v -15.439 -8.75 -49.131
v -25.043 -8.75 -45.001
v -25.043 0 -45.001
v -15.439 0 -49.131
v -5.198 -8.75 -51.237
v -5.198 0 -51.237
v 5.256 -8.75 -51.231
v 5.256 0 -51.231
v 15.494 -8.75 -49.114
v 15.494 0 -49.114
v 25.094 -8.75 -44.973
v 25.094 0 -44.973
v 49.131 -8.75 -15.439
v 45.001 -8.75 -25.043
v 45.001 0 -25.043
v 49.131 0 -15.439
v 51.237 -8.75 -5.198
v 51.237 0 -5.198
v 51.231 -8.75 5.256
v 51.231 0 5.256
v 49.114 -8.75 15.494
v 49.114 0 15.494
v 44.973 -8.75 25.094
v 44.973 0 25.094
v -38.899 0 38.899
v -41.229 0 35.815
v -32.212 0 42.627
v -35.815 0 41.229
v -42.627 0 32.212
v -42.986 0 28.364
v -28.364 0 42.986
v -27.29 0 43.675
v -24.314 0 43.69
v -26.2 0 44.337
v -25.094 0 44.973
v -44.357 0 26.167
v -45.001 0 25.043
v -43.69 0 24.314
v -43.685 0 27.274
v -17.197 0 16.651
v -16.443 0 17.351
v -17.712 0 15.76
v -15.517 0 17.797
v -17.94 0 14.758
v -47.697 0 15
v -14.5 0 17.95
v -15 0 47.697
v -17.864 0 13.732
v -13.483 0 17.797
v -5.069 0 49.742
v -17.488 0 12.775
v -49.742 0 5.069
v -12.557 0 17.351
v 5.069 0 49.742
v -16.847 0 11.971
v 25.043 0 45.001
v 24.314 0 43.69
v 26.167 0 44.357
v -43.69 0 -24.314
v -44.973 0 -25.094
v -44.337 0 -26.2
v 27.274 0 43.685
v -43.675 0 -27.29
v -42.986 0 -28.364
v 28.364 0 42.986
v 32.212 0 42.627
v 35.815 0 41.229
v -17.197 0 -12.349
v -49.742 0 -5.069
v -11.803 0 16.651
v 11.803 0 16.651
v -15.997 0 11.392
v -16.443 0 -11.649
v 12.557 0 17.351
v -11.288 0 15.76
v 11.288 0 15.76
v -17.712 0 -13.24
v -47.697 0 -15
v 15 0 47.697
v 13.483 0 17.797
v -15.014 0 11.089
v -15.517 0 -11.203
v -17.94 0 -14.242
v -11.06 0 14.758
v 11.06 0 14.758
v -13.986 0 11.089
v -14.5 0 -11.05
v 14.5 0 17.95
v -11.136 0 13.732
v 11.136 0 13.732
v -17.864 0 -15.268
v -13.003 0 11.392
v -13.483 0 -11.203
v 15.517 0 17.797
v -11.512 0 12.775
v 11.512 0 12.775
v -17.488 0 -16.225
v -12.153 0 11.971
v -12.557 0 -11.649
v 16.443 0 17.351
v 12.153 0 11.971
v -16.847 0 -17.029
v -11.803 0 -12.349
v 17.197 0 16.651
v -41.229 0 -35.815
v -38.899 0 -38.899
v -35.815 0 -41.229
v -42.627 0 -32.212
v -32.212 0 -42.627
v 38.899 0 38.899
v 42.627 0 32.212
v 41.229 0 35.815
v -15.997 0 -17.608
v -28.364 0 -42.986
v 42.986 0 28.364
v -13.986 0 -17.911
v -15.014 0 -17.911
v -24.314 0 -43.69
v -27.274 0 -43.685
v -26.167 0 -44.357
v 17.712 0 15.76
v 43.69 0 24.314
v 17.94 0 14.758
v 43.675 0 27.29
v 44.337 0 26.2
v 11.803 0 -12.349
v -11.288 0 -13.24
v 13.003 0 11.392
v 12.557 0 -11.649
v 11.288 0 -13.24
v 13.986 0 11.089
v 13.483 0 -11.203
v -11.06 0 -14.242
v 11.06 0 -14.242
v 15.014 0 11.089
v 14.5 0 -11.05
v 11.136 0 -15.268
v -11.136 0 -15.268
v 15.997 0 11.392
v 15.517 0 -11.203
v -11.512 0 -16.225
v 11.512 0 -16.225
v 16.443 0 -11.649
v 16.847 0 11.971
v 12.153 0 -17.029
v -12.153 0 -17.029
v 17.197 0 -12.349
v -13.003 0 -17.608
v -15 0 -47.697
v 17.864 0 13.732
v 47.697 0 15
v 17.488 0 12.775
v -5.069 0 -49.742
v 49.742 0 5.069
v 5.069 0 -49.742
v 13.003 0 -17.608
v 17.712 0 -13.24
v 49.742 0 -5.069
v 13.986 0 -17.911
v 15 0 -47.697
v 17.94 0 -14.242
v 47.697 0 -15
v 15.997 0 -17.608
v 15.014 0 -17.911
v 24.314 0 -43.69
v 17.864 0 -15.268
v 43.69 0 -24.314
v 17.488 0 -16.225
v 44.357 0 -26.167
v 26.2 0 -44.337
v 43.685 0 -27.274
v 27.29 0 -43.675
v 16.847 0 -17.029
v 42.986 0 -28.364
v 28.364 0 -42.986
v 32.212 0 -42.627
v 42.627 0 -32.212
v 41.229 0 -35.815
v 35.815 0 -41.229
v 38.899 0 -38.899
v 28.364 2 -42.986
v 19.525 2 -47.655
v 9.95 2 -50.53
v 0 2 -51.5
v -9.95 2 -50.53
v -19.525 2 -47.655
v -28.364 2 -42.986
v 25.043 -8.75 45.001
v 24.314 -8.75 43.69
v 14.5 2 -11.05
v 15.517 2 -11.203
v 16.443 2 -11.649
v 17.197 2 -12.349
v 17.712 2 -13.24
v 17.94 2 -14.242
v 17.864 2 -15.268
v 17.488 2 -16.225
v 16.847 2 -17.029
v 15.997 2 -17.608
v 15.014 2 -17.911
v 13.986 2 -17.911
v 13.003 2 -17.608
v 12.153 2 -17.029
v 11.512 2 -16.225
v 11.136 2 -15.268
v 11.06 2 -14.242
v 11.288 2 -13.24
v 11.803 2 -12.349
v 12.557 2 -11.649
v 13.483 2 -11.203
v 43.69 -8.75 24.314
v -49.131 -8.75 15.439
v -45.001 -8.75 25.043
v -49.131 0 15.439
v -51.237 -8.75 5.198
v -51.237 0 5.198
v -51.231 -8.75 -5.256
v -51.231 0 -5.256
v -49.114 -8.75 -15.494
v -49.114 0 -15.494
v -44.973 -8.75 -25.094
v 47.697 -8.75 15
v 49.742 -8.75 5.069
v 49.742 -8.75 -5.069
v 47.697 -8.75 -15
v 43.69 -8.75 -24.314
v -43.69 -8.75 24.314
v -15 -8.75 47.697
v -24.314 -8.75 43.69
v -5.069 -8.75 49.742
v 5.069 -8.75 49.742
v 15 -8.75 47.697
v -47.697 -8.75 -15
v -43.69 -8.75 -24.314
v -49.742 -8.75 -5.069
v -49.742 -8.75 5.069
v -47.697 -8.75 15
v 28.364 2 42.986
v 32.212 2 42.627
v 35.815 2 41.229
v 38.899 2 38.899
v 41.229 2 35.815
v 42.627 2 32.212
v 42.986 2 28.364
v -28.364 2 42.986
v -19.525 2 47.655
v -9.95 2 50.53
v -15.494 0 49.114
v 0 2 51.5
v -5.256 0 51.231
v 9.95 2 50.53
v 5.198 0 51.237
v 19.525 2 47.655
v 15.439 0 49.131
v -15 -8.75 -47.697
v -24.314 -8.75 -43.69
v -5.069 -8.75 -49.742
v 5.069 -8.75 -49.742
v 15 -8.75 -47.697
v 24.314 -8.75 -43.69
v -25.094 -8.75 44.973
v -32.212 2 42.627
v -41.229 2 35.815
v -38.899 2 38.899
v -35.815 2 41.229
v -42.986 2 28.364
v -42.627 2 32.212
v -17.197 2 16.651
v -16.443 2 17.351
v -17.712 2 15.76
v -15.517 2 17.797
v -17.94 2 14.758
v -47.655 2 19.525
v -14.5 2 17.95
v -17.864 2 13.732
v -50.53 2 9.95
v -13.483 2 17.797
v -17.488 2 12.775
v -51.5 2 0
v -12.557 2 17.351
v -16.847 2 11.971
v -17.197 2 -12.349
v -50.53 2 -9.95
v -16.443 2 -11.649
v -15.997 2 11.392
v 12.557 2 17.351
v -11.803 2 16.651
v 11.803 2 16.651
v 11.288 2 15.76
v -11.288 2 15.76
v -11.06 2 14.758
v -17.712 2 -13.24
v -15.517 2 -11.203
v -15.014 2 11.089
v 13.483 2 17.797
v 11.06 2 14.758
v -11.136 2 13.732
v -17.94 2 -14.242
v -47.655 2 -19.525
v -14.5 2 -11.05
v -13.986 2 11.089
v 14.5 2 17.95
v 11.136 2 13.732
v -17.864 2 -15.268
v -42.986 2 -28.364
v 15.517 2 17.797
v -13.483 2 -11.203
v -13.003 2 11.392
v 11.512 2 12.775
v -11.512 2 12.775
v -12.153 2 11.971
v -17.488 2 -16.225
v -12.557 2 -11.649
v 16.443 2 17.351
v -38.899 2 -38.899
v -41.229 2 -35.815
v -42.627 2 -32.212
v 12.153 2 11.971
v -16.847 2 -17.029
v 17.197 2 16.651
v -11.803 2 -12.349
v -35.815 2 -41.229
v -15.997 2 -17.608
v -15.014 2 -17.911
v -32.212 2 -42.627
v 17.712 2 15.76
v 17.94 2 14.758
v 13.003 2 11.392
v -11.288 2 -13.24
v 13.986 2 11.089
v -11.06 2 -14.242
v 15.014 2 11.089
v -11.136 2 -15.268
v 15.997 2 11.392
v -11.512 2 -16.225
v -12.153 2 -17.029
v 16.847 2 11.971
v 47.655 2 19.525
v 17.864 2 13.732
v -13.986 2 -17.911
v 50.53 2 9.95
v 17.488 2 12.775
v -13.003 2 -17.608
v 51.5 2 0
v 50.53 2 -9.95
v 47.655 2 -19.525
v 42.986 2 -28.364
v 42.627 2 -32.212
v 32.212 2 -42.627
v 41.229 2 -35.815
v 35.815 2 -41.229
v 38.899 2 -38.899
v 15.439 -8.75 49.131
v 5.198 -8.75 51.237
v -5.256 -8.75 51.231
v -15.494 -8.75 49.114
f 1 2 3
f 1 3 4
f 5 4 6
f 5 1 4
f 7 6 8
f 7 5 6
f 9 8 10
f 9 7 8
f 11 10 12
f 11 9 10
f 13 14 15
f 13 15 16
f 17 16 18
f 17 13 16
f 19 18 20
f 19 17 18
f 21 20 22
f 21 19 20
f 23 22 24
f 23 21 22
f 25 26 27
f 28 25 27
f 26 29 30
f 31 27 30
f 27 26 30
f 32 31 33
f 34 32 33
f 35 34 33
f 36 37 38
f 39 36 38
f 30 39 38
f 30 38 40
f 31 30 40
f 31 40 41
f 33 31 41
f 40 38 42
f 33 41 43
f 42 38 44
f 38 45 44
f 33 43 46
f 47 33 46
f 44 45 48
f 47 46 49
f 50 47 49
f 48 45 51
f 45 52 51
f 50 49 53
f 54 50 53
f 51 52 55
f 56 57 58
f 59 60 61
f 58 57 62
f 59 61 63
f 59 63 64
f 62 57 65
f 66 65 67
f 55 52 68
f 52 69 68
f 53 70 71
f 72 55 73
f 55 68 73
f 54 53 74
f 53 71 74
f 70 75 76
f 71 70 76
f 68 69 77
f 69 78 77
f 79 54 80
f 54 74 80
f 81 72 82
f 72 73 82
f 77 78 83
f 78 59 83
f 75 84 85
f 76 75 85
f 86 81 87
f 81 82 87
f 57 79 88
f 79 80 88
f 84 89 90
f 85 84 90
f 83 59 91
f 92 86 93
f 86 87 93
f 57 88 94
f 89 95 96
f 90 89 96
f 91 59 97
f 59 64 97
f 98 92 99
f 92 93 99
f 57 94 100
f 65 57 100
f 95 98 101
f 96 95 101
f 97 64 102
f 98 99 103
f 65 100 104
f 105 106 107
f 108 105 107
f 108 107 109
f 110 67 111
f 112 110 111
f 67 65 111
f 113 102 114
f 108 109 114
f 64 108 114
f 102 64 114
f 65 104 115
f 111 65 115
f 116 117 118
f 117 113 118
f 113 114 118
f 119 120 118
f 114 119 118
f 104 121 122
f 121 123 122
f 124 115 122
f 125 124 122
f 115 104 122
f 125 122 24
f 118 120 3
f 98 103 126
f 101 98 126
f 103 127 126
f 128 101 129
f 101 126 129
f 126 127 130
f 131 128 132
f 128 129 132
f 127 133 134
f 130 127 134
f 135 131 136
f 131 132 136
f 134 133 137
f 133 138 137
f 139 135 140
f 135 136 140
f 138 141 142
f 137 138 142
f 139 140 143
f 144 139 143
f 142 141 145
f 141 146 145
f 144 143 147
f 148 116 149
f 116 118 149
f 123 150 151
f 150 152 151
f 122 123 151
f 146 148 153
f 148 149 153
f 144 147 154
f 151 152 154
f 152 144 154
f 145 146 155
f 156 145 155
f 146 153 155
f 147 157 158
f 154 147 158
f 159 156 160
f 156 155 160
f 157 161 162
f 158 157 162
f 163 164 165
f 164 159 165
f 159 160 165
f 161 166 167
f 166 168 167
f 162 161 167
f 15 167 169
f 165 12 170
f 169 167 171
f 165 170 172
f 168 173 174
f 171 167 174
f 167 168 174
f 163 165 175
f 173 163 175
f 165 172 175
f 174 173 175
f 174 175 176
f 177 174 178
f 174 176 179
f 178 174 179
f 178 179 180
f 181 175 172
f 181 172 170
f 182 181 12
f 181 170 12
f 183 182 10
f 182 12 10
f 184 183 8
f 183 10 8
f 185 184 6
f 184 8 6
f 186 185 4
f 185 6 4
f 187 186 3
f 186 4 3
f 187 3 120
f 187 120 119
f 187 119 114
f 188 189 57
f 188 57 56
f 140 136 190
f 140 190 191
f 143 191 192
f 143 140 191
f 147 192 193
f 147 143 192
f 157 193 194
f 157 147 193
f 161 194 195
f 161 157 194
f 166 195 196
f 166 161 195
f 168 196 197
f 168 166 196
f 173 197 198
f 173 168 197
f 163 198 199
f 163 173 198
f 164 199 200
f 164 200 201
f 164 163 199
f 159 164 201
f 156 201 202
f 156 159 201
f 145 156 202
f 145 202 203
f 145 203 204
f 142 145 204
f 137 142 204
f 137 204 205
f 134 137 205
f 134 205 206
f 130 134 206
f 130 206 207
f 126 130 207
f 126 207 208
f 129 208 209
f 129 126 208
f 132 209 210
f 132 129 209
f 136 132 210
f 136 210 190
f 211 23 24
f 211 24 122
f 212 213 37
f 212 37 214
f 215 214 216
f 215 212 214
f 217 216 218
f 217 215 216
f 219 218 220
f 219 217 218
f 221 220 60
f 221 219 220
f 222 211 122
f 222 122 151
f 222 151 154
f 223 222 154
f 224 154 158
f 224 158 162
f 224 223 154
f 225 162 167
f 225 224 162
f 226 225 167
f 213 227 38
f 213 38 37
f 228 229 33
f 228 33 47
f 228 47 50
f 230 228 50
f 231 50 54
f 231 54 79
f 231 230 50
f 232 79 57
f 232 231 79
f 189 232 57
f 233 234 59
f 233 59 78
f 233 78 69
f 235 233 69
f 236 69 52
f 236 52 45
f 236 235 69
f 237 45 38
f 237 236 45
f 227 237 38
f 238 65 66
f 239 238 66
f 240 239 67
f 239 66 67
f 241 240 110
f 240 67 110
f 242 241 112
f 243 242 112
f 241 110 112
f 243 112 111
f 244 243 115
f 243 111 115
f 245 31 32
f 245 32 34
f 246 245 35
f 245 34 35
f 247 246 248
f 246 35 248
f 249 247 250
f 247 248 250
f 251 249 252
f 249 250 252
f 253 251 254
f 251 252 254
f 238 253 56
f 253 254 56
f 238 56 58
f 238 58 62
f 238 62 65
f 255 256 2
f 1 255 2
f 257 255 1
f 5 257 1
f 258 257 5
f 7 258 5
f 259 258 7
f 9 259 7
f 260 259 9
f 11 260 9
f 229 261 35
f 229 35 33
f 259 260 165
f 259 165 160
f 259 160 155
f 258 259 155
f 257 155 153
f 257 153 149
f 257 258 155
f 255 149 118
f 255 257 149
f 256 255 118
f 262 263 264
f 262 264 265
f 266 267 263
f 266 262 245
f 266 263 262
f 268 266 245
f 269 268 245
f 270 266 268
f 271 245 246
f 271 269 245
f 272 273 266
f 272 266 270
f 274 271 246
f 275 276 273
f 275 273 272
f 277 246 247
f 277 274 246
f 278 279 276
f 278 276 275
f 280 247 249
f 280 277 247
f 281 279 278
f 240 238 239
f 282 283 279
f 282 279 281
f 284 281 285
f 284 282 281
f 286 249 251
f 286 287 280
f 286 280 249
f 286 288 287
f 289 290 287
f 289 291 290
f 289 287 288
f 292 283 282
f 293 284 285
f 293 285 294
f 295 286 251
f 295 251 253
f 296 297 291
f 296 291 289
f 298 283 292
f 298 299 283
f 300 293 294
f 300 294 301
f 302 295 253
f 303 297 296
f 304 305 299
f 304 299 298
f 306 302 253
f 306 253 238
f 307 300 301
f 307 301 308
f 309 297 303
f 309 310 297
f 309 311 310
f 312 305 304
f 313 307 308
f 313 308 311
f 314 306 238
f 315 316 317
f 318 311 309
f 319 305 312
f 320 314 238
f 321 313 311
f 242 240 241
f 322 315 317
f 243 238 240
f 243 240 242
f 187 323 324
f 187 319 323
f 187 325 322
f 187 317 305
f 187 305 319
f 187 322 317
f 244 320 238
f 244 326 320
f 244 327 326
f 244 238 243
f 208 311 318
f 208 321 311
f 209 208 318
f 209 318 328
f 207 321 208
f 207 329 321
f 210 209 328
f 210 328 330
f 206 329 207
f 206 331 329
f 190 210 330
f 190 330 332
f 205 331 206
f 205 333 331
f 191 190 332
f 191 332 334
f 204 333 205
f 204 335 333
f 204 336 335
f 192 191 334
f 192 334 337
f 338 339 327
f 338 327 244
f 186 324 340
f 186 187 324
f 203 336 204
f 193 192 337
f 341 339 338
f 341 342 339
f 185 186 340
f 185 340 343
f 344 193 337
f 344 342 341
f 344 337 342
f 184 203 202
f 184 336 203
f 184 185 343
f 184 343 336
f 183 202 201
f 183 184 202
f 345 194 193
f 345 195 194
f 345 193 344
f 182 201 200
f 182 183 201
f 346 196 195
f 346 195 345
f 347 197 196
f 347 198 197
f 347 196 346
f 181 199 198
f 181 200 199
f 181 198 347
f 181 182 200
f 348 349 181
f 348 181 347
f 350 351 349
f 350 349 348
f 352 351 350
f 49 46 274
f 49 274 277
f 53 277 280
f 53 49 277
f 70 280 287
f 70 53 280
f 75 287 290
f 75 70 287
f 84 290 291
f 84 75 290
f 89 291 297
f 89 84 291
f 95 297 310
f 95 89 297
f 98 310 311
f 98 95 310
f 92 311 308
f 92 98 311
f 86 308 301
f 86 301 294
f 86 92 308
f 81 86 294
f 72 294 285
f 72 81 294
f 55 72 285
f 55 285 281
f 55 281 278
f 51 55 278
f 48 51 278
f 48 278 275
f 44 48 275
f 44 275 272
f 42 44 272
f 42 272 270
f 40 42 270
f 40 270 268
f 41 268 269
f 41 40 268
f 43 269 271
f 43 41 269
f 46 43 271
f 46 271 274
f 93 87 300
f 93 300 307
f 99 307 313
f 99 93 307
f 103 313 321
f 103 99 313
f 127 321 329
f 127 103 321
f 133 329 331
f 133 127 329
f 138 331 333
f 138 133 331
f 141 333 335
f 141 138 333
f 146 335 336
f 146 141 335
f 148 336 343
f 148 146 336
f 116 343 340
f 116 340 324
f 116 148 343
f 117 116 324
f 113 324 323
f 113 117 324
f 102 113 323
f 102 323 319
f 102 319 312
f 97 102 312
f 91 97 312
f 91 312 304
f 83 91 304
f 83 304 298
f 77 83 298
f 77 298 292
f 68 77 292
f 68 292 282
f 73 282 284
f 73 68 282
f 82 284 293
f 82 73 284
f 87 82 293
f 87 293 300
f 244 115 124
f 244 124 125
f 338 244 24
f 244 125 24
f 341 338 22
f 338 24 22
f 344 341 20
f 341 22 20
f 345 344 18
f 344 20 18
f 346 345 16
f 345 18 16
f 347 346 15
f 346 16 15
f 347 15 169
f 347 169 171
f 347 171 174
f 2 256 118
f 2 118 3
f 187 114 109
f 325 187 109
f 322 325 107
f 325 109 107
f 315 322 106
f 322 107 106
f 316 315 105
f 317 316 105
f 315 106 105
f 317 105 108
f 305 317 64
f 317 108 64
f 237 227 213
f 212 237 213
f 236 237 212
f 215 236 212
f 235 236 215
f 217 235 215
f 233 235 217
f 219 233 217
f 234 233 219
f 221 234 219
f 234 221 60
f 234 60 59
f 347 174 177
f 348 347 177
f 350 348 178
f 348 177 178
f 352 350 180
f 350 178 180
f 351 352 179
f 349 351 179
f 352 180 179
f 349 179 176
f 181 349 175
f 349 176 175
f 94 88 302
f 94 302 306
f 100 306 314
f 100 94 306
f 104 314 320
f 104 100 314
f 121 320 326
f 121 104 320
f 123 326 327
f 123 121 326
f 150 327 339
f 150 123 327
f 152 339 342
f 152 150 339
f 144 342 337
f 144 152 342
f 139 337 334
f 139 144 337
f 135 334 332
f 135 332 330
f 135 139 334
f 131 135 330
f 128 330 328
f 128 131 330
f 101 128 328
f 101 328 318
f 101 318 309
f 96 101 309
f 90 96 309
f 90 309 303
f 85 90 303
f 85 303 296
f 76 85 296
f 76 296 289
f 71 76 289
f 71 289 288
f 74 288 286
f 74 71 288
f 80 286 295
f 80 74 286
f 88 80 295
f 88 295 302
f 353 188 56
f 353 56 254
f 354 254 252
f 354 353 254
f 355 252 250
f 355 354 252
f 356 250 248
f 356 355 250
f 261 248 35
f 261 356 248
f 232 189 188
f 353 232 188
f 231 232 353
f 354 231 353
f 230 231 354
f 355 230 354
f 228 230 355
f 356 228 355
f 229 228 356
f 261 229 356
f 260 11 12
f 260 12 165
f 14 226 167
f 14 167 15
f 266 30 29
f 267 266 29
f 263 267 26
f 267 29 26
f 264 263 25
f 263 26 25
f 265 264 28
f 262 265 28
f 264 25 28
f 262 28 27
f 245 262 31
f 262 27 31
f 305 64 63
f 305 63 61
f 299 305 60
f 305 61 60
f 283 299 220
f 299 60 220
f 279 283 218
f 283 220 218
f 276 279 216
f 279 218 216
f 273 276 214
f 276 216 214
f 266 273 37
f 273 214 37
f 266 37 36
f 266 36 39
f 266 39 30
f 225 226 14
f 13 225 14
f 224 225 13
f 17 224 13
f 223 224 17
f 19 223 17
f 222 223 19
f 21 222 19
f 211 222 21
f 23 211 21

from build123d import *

# Parameters (mm, degrees)
SKETCH1_R           = 3.45
BOSS_EXTRUDE1_DEPTH = 2
BOSS_EXTRUDE2_START = 8.75
BOSS_EXTRUDE2_DEPTH = 8.75
CIRPATTERN1_COUNT   = 4


with BuildPart() as part:
    # Sketch1 → Boss-Extrude1 (new body)
    with BuildSketch(Plane(origin=(0, 0, 0), x_dir=(1, 0, 0), z_dir=(0, 1, 0))):
        with BuildLine():
            ThreePointArc((28.363609444, -42.985528487), (38.899494937, -38.899494937), (42.985528487, -28.363609444))
            ThreePointArc((42.985528487, -28.363609444), (51.5, 0), (42.985528487, 28.363609444))
            ThreePointArc((42.985528487, 28.363609444), (38.899494937, 38.899494937), (28.363609444, 42.985528487))
            ThreePointArc((28.363609444, 42.985528487), (0, 51.5), (-28.363609444, 42.985528487))
            ThreePointArc((-28.363609444, 42.985528487), (-38.899494937, 38.899494937), (-42.985528487, 28.363609444))
            ThreePointArc((-42.985528487, 28.363609444), (-51.5, 0), (-42.985528487, -28.363609444))
            ThreePointArc((-42.985528487, -28.363609444), (-38.899494937, -38.899494937), (-28.363609444, -42.985528487))
            ThreePointArc((-28.363609444, -42.985528487), (0, -51.5), (28.363609444, -42.985528487))
        make_face()
        with Locations(Location((14.5, 14.5, 0), (0, 0, 270))):
            Circle(SKETCH1_R, mode=Mode.SUBTRACT)
        with Locations(Location((-14.5, 14.5, 0), (0, 0, 270))):
            Circle(SKETCH1_R, mode=Mode.SUBTRACT)
        with Locations(Location((-14.5, -14.5, 0), (0, 0, 270))):
            Circle(SKETCH1_R, mode=Mode.SUBTRACT)
        with Locations(Location((14.5, -14.5, 0), (0, 0, 270))):
            Circle(SKETCH1_R, mode=Mode.SUBTRACT)
    extrude(amount=BOSS_EXTRUDE1_DEPTH)

    # Sketch2 → Boss-Extrude2 (add)
    with BuildSketch(Plane.XZ.offset(BOSS_EXTRUDE2_START)):
        with BuildLine():
            Line((43.690302721, -24.313729622), (45.001011803, -25.043141511))
            ThreePointArc((45.001011803, -25.043141511), (51.499991825, 0.029017326), (44.972762458, 25.093836632))
            Line((44.972762458, 25.093836632), (43.690302721, 24.313729622))
            ThreePointArc((43.690302721, 24.313729622), (50, 0), (43.690302721, -24.313729622))
        make_face()
    boss_extrude2 = extrude(amount=-BOSS_EXTRUDE2_DEPTH)

    # CirPattern1: Boss-Extrude2 ×4 about axis
    cirpattern1_axis = Axis((0, 0, 0), (0, 1, 0))
    for i in range(1, CIRPATTERN1_COUNT):
        add(boss_extrude2.rotate(cirpattern1_axis, i * 360 / CIRPATTERN1_COUNT))


solid = part.part
